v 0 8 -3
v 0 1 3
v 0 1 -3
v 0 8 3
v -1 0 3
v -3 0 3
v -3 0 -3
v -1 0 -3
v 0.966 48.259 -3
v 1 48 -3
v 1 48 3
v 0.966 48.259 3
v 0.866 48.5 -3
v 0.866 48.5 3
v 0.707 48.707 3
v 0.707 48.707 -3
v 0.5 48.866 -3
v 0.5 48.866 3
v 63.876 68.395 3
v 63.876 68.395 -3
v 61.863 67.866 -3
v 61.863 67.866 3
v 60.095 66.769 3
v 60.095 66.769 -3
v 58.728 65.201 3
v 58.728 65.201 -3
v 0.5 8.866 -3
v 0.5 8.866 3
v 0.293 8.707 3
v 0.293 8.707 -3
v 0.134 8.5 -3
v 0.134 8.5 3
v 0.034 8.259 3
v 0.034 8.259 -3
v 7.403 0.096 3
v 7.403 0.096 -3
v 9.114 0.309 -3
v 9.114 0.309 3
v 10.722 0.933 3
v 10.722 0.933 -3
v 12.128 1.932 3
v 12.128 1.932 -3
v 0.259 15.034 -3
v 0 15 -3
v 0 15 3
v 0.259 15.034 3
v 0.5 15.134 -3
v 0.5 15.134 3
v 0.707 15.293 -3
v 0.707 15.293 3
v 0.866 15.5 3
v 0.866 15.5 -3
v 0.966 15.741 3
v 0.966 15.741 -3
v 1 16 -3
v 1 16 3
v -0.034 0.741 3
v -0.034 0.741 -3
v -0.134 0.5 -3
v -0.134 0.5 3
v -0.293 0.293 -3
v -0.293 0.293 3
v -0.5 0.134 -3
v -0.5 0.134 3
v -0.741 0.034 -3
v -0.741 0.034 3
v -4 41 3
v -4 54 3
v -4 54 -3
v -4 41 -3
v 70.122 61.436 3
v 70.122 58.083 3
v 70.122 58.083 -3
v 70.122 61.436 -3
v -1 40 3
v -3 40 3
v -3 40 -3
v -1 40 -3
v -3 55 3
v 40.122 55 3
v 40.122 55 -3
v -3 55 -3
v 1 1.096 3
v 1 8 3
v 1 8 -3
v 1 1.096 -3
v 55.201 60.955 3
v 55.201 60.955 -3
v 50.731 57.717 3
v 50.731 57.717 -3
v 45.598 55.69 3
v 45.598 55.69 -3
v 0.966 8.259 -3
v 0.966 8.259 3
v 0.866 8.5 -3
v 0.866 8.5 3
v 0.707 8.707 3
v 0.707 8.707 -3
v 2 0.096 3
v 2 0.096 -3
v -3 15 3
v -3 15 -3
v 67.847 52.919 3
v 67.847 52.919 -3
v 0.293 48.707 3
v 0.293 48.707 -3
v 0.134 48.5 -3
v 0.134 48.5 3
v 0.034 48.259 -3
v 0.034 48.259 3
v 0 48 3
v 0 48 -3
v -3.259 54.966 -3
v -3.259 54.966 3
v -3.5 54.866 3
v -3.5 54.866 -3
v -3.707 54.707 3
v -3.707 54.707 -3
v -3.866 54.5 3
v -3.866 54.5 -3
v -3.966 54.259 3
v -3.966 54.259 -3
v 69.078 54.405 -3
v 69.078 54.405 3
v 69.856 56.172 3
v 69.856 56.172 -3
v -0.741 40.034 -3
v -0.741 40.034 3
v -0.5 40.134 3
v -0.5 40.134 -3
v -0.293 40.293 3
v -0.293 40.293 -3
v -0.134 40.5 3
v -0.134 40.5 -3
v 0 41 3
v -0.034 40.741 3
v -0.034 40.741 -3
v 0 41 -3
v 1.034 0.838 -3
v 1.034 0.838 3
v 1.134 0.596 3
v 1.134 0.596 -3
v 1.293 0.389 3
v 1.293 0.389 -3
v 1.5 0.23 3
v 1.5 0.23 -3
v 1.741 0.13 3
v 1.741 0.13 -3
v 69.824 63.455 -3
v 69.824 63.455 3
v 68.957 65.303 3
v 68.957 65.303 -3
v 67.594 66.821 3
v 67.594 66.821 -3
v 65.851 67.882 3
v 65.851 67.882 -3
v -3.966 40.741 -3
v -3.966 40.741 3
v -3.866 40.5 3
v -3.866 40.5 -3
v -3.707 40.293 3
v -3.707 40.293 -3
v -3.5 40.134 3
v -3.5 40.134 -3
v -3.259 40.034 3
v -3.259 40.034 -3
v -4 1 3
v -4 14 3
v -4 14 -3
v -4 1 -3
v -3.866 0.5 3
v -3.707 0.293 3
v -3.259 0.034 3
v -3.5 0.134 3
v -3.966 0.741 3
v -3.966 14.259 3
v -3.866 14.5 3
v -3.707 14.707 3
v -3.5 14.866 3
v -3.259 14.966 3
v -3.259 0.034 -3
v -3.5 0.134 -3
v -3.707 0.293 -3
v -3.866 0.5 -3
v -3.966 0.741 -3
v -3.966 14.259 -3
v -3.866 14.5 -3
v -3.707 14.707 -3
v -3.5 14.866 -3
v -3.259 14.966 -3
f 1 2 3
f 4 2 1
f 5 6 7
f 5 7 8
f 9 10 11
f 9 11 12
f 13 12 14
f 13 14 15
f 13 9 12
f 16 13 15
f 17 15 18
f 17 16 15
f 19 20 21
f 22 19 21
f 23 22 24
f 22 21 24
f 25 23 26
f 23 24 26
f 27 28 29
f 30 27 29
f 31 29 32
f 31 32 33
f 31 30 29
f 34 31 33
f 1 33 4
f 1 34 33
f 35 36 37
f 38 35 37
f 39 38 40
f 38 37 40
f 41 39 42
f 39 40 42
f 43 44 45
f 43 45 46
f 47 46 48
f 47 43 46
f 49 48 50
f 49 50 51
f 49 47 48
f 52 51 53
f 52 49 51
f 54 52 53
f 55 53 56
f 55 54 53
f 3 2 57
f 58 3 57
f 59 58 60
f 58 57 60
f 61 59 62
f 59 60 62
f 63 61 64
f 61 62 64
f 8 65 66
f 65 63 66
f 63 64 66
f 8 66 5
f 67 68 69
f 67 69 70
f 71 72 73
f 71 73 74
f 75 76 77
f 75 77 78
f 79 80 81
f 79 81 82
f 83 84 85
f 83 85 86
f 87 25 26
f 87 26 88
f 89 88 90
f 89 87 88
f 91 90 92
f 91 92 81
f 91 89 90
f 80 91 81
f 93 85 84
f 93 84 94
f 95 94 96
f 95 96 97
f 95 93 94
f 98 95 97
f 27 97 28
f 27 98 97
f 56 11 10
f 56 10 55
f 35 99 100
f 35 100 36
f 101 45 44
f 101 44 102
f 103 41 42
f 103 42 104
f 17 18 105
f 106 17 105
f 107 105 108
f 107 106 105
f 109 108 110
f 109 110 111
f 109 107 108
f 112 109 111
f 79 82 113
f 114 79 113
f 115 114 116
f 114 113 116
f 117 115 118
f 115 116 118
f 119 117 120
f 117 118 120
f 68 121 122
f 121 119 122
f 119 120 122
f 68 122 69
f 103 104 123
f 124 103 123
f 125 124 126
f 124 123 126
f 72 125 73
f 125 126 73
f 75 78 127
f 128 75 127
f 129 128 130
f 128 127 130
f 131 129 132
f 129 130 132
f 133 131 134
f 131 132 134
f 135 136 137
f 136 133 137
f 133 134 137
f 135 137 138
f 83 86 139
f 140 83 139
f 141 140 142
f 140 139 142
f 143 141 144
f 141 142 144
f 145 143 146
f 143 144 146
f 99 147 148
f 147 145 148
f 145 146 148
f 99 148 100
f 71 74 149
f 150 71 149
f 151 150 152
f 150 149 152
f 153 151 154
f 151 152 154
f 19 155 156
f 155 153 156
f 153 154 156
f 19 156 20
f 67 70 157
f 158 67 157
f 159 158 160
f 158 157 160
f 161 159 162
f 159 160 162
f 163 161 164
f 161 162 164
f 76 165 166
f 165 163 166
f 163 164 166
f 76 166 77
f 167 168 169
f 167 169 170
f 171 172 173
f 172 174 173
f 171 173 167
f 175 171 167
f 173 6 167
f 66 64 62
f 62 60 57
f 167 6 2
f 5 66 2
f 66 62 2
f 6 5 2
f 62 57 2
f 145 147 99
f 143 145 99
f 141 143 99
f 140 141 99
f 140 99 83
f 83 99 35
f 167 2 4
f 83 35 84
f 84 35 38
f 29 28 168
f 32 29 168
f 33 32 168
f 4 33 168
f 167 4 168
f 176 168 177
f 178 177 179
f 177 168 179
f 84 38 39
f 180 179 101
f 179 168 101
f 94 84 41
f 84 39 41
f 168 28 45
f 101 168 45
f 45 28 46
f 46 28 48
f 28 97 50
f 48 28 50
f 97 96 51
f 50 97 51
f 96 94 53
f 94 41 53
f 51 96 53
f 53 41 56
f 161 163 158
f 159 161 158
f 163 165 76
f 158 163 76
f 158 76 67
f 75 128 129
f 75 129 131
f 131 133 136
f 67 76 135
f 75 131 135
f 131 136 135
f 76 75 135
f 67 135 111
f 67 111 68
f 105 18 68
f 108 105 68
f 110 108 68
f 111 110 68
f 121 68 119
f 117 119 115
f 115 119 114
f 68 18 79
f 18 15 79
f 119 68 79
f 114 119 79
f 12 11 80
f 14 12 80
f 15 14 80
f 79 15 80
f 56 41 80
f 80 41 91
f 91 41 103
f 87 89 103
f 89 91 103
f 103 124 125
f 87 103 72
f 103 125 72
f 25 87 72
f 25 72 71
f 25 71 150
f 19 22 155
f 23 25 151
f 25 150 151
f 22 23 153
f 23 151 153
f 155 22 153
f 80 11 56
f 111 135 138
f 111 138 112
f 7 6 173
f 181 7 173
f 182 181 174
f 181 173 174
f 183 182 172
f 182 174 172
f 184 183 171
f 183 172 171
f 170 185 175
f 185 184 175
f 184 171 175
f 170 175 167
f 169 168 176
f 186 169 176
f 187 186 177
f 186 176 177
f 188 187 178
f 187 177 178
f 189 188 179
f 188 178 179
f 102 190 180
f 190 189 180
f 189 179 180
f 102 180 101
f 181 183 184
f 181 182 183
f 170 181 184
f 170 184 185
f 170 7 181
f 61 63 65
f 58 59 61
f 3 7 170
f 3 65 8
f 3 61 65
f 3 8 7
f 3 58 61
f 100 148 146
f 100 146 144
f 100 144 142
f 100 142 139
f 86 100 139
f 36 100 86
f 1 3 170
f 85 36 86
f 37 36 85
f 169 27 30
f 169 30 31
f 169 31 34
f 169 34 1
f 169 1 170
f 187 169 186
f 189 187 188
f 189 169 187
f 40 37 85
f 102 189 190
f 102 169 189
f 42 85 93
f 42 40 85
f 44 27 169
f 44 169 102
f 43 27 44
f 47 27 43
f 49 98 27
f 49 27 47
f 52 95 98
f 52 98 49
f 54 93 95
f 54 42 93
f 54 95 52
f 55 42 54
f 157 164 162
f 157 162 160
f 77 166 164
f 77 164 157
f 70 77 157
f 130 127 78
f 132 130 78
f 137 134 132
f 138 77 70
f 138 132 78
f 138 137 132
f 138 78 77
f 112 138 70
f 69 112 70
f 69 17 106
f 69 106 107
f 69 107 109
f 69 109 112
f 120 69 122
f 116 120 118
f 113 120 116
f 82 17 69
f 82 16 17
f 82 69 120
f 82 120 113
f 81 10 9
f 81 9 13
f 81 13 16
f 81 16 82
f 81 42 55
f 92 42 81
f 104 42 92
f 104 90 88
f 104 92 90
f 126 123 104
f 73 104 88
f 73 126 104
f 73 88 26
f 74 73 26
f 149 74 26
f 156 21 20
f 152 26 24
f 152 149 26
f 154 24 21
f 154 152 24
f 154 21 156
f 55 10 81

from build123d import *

# Parameters (mm, degrees)
BOSS_EXTRU_1_DEPTH = 3
CONG_3_R           = 1
CONG_4_R           = 7


with BuildPart() as part:
    # Esquisse1 → Boss.-Extru.1 (new, symmetric)
    with BuildSketch(Plane.XY):
        with BuildLine():
            Line((0, 0), (0, 9))
            Line((0, 9), (1, 9))
            Line((1, 9), (1, 0.09638948))
            Line((1, 0.09638948), (10.121873618, 0.09638948))
            Line((10.121873618, 0.09638948), (70.121873618, 55))
            Line((70.121873618, 55), (70.121873618, 68.436194763))
            Line((70.121873618, 68.436194763), (60.432430442, 68.436194763))
            ThreePointArc((60.432430442, 68.436194763), (52.298183077, 58.663045958), (40.121873618, 55))
            Line((40.121873618, 55), (19.293191489, 55))
            Line((19.293191489, 55), (10.121873618, 55))
            Line((10.121873618, 55), (-4, 55))
            Line((-4, 55), (-4, 40))
            Line((-4, 40), (0, 40))
            Line((0, 40), (0, 49))
            Line((0, 49), (1, 49))
            Line((1, 49), (1, 15))
            Line((1, 15), (-4, 15))
            Line((-4, 15), (-4, 0))
            Line((-4, 0), (0, 0))
        make_face()
    extrude(amount=BOSS_EXTRU_1_DEPTH, both=True)

    # Congé3
    # the kernel refuses this fillet: 1 mm, written as the material it adds along each edge
    with BuildSketch(Plane(origin=(1, 9, -3), x_dir=(0, -1, 0), z_dir=(0, 0, 1)), Plane(origin=(1, 15, -3), x_dir=(-1, 0, 0), z_dir=(0, 0, 1)), Plane(origin=(1, 49, -3), x_dir=(0, -1, 0), z_dir=(0, 0, 1)), Plane(origin=(0, 49, -3), x_dir=(1, 0, 0), z_dir=(0, 0, 1))) as cong_3_piece_1:
        with BuildLine():
            CenterArc((CONG_3_R, -CONG_3_R), CONG_3_R, 90, 90)
            Line((0, -CONG_3_R), (0, 0))
            Line((0, 0), (CONG_3_R, 0))
        make_face()
    extrude(amount=6)
    with BuildSketch(Plane(origin=(0, 9, -3), x_dir=(0, -1, 0), z_dir=(0, 0, 1))) as cong_3_piece_2:
        with BuildLine():
            CenterArc((CONG_3_R, CONG_3_R), CONG_3_R, 180, 90)
            Line((0, CONG_3_R), (0, 0))
            Line((0, 0), (CONG_3_R, 0))
        make_face()
    extrude(amount=6)
    # the kernel refuses this fillet: 1 mm, written as the material it takes off along each edge
    with BuildSketch(Plane(origin=(1, 0.09638948, -5.5), x_dir=(0, 1, 0), z_dir=(0, 0, 1)), Plane(origin=(0, 0, 5.5), x_dir=(0, 1, 0), z_dir=(0, 0, -1)), Plane(origin=(-4, 0, 5.5), x_dir=(1, 0, 0), z_dir=(0, 0, -1)), Plane(origin=(-4, 15, 5.5), x_dir=(0, -1, 0), z_dir=(0, 0, -1)), Plane(origin=(0, 40, -5.5), x_dir=(-1, 0, 0), z_dir=(0, 0, 1)), Plane(origin=(-4, 40, -5.5), x_dir=(0, 1, 0), z_dir=(0, 0, 1)), Plane(origin=(-4, 55, -5.5), x_dir=(1, 0, 0), z_dir=(0, 0, 1))) as cong_3_2_piece_1:
        with BuildLine():
            CenterArc((CONG_3_R, -CONG_3_R), CONG_3_R, 90, 90)
            Line((0, -CONG_3_R), (0, 0))
            Line((0, 0), (CONG_3_R, 0))
        make_face()
    extrude(amount=11, mode=Mode.SUBTRACT)

    # Congé4
    # the kernel refuses this fillet: 7 mm, written as the material it takes off along each edge
    with BuildSketch(Plane(origin=(10.121873618, 0.09638948, -9.798414872), x_dir=(-1, 0, 0), z_dir=(0, 0, 1))) as cong_4_piece_1:
        with BuildLine():
            CenterArc((CONG_4_R * 0.388480849828, -CONG_4_R), CONG_4_R, 90, 42.460390035)
            Line((-CONG_4_R * 0.286599498638, -CONG_4_R * 0.262255787474), (0, 0))
            Line((0, 0), (CONG_4_R * 0.388480849828, 0))
        make_face()
    extrude(amount=19.596829744, mode=Mode.SUBTRACT)
    with BuildSketch(Plane(origin=(70.121873618, 55, -10.707405636), x_dir=(-0.7377442125256176, -0.6750803484659854, 0), z_dir=(0, 0, 1))) as cong_4_piece_2:
        with BuildLine():
            CenterArc((CONG_4_R * 0.440423179223, -CONG_4_R), CONG_4_R, 90, 47.539609965)
            Line((-CONG_4_R * 0.297321033302, -CONG_4_R * 0.324919651534), (0, 0))
            Line((0, 0), (CONG_4_R * 0.440423179223, 0))
        make_face()
    extrude(amount=21.414811273, mode=Mode.SUBTRACT)
    with BuildSketch(Plane(origin=(70.121873618, 68.436194763, -20.5), x_dir=(0, -1, 0), z_dir=(0, 0, 1))) as cong_4_piece_3:
        with BuildLine():
            CenterArc((CONG_4_R, -CONG_4_R), CONG_4_R, 90, 90)
            Line((0, -CONG_4_R), (0, 0))
            Line((0, 0), (CONG_4_R, 0))
        make_face()
    extrude(amount=41, mode=Mode.SUBTRACT)
    with BuildSketch(Plane(origin=(60.432430442, 68.436194763, -13.492760312), x_dir=(1, 0, 0), z_dir=(0, 0, 1))) as cong_4_piece_4:
        with BuildLine():
            CenterArc((4.197104125, -7), CONG_4_R, 90, 57.467043301)
            ThreePointArc((-1.704471625, -3.235507515), (-0.785102058, -1.653119949), (0, 0))
            Line((0, 0), (4.197104125, 0))
        make_face()
    extrude(amount=26.985520624, mode=Mode.SUBTRACT)


solid = part.part
